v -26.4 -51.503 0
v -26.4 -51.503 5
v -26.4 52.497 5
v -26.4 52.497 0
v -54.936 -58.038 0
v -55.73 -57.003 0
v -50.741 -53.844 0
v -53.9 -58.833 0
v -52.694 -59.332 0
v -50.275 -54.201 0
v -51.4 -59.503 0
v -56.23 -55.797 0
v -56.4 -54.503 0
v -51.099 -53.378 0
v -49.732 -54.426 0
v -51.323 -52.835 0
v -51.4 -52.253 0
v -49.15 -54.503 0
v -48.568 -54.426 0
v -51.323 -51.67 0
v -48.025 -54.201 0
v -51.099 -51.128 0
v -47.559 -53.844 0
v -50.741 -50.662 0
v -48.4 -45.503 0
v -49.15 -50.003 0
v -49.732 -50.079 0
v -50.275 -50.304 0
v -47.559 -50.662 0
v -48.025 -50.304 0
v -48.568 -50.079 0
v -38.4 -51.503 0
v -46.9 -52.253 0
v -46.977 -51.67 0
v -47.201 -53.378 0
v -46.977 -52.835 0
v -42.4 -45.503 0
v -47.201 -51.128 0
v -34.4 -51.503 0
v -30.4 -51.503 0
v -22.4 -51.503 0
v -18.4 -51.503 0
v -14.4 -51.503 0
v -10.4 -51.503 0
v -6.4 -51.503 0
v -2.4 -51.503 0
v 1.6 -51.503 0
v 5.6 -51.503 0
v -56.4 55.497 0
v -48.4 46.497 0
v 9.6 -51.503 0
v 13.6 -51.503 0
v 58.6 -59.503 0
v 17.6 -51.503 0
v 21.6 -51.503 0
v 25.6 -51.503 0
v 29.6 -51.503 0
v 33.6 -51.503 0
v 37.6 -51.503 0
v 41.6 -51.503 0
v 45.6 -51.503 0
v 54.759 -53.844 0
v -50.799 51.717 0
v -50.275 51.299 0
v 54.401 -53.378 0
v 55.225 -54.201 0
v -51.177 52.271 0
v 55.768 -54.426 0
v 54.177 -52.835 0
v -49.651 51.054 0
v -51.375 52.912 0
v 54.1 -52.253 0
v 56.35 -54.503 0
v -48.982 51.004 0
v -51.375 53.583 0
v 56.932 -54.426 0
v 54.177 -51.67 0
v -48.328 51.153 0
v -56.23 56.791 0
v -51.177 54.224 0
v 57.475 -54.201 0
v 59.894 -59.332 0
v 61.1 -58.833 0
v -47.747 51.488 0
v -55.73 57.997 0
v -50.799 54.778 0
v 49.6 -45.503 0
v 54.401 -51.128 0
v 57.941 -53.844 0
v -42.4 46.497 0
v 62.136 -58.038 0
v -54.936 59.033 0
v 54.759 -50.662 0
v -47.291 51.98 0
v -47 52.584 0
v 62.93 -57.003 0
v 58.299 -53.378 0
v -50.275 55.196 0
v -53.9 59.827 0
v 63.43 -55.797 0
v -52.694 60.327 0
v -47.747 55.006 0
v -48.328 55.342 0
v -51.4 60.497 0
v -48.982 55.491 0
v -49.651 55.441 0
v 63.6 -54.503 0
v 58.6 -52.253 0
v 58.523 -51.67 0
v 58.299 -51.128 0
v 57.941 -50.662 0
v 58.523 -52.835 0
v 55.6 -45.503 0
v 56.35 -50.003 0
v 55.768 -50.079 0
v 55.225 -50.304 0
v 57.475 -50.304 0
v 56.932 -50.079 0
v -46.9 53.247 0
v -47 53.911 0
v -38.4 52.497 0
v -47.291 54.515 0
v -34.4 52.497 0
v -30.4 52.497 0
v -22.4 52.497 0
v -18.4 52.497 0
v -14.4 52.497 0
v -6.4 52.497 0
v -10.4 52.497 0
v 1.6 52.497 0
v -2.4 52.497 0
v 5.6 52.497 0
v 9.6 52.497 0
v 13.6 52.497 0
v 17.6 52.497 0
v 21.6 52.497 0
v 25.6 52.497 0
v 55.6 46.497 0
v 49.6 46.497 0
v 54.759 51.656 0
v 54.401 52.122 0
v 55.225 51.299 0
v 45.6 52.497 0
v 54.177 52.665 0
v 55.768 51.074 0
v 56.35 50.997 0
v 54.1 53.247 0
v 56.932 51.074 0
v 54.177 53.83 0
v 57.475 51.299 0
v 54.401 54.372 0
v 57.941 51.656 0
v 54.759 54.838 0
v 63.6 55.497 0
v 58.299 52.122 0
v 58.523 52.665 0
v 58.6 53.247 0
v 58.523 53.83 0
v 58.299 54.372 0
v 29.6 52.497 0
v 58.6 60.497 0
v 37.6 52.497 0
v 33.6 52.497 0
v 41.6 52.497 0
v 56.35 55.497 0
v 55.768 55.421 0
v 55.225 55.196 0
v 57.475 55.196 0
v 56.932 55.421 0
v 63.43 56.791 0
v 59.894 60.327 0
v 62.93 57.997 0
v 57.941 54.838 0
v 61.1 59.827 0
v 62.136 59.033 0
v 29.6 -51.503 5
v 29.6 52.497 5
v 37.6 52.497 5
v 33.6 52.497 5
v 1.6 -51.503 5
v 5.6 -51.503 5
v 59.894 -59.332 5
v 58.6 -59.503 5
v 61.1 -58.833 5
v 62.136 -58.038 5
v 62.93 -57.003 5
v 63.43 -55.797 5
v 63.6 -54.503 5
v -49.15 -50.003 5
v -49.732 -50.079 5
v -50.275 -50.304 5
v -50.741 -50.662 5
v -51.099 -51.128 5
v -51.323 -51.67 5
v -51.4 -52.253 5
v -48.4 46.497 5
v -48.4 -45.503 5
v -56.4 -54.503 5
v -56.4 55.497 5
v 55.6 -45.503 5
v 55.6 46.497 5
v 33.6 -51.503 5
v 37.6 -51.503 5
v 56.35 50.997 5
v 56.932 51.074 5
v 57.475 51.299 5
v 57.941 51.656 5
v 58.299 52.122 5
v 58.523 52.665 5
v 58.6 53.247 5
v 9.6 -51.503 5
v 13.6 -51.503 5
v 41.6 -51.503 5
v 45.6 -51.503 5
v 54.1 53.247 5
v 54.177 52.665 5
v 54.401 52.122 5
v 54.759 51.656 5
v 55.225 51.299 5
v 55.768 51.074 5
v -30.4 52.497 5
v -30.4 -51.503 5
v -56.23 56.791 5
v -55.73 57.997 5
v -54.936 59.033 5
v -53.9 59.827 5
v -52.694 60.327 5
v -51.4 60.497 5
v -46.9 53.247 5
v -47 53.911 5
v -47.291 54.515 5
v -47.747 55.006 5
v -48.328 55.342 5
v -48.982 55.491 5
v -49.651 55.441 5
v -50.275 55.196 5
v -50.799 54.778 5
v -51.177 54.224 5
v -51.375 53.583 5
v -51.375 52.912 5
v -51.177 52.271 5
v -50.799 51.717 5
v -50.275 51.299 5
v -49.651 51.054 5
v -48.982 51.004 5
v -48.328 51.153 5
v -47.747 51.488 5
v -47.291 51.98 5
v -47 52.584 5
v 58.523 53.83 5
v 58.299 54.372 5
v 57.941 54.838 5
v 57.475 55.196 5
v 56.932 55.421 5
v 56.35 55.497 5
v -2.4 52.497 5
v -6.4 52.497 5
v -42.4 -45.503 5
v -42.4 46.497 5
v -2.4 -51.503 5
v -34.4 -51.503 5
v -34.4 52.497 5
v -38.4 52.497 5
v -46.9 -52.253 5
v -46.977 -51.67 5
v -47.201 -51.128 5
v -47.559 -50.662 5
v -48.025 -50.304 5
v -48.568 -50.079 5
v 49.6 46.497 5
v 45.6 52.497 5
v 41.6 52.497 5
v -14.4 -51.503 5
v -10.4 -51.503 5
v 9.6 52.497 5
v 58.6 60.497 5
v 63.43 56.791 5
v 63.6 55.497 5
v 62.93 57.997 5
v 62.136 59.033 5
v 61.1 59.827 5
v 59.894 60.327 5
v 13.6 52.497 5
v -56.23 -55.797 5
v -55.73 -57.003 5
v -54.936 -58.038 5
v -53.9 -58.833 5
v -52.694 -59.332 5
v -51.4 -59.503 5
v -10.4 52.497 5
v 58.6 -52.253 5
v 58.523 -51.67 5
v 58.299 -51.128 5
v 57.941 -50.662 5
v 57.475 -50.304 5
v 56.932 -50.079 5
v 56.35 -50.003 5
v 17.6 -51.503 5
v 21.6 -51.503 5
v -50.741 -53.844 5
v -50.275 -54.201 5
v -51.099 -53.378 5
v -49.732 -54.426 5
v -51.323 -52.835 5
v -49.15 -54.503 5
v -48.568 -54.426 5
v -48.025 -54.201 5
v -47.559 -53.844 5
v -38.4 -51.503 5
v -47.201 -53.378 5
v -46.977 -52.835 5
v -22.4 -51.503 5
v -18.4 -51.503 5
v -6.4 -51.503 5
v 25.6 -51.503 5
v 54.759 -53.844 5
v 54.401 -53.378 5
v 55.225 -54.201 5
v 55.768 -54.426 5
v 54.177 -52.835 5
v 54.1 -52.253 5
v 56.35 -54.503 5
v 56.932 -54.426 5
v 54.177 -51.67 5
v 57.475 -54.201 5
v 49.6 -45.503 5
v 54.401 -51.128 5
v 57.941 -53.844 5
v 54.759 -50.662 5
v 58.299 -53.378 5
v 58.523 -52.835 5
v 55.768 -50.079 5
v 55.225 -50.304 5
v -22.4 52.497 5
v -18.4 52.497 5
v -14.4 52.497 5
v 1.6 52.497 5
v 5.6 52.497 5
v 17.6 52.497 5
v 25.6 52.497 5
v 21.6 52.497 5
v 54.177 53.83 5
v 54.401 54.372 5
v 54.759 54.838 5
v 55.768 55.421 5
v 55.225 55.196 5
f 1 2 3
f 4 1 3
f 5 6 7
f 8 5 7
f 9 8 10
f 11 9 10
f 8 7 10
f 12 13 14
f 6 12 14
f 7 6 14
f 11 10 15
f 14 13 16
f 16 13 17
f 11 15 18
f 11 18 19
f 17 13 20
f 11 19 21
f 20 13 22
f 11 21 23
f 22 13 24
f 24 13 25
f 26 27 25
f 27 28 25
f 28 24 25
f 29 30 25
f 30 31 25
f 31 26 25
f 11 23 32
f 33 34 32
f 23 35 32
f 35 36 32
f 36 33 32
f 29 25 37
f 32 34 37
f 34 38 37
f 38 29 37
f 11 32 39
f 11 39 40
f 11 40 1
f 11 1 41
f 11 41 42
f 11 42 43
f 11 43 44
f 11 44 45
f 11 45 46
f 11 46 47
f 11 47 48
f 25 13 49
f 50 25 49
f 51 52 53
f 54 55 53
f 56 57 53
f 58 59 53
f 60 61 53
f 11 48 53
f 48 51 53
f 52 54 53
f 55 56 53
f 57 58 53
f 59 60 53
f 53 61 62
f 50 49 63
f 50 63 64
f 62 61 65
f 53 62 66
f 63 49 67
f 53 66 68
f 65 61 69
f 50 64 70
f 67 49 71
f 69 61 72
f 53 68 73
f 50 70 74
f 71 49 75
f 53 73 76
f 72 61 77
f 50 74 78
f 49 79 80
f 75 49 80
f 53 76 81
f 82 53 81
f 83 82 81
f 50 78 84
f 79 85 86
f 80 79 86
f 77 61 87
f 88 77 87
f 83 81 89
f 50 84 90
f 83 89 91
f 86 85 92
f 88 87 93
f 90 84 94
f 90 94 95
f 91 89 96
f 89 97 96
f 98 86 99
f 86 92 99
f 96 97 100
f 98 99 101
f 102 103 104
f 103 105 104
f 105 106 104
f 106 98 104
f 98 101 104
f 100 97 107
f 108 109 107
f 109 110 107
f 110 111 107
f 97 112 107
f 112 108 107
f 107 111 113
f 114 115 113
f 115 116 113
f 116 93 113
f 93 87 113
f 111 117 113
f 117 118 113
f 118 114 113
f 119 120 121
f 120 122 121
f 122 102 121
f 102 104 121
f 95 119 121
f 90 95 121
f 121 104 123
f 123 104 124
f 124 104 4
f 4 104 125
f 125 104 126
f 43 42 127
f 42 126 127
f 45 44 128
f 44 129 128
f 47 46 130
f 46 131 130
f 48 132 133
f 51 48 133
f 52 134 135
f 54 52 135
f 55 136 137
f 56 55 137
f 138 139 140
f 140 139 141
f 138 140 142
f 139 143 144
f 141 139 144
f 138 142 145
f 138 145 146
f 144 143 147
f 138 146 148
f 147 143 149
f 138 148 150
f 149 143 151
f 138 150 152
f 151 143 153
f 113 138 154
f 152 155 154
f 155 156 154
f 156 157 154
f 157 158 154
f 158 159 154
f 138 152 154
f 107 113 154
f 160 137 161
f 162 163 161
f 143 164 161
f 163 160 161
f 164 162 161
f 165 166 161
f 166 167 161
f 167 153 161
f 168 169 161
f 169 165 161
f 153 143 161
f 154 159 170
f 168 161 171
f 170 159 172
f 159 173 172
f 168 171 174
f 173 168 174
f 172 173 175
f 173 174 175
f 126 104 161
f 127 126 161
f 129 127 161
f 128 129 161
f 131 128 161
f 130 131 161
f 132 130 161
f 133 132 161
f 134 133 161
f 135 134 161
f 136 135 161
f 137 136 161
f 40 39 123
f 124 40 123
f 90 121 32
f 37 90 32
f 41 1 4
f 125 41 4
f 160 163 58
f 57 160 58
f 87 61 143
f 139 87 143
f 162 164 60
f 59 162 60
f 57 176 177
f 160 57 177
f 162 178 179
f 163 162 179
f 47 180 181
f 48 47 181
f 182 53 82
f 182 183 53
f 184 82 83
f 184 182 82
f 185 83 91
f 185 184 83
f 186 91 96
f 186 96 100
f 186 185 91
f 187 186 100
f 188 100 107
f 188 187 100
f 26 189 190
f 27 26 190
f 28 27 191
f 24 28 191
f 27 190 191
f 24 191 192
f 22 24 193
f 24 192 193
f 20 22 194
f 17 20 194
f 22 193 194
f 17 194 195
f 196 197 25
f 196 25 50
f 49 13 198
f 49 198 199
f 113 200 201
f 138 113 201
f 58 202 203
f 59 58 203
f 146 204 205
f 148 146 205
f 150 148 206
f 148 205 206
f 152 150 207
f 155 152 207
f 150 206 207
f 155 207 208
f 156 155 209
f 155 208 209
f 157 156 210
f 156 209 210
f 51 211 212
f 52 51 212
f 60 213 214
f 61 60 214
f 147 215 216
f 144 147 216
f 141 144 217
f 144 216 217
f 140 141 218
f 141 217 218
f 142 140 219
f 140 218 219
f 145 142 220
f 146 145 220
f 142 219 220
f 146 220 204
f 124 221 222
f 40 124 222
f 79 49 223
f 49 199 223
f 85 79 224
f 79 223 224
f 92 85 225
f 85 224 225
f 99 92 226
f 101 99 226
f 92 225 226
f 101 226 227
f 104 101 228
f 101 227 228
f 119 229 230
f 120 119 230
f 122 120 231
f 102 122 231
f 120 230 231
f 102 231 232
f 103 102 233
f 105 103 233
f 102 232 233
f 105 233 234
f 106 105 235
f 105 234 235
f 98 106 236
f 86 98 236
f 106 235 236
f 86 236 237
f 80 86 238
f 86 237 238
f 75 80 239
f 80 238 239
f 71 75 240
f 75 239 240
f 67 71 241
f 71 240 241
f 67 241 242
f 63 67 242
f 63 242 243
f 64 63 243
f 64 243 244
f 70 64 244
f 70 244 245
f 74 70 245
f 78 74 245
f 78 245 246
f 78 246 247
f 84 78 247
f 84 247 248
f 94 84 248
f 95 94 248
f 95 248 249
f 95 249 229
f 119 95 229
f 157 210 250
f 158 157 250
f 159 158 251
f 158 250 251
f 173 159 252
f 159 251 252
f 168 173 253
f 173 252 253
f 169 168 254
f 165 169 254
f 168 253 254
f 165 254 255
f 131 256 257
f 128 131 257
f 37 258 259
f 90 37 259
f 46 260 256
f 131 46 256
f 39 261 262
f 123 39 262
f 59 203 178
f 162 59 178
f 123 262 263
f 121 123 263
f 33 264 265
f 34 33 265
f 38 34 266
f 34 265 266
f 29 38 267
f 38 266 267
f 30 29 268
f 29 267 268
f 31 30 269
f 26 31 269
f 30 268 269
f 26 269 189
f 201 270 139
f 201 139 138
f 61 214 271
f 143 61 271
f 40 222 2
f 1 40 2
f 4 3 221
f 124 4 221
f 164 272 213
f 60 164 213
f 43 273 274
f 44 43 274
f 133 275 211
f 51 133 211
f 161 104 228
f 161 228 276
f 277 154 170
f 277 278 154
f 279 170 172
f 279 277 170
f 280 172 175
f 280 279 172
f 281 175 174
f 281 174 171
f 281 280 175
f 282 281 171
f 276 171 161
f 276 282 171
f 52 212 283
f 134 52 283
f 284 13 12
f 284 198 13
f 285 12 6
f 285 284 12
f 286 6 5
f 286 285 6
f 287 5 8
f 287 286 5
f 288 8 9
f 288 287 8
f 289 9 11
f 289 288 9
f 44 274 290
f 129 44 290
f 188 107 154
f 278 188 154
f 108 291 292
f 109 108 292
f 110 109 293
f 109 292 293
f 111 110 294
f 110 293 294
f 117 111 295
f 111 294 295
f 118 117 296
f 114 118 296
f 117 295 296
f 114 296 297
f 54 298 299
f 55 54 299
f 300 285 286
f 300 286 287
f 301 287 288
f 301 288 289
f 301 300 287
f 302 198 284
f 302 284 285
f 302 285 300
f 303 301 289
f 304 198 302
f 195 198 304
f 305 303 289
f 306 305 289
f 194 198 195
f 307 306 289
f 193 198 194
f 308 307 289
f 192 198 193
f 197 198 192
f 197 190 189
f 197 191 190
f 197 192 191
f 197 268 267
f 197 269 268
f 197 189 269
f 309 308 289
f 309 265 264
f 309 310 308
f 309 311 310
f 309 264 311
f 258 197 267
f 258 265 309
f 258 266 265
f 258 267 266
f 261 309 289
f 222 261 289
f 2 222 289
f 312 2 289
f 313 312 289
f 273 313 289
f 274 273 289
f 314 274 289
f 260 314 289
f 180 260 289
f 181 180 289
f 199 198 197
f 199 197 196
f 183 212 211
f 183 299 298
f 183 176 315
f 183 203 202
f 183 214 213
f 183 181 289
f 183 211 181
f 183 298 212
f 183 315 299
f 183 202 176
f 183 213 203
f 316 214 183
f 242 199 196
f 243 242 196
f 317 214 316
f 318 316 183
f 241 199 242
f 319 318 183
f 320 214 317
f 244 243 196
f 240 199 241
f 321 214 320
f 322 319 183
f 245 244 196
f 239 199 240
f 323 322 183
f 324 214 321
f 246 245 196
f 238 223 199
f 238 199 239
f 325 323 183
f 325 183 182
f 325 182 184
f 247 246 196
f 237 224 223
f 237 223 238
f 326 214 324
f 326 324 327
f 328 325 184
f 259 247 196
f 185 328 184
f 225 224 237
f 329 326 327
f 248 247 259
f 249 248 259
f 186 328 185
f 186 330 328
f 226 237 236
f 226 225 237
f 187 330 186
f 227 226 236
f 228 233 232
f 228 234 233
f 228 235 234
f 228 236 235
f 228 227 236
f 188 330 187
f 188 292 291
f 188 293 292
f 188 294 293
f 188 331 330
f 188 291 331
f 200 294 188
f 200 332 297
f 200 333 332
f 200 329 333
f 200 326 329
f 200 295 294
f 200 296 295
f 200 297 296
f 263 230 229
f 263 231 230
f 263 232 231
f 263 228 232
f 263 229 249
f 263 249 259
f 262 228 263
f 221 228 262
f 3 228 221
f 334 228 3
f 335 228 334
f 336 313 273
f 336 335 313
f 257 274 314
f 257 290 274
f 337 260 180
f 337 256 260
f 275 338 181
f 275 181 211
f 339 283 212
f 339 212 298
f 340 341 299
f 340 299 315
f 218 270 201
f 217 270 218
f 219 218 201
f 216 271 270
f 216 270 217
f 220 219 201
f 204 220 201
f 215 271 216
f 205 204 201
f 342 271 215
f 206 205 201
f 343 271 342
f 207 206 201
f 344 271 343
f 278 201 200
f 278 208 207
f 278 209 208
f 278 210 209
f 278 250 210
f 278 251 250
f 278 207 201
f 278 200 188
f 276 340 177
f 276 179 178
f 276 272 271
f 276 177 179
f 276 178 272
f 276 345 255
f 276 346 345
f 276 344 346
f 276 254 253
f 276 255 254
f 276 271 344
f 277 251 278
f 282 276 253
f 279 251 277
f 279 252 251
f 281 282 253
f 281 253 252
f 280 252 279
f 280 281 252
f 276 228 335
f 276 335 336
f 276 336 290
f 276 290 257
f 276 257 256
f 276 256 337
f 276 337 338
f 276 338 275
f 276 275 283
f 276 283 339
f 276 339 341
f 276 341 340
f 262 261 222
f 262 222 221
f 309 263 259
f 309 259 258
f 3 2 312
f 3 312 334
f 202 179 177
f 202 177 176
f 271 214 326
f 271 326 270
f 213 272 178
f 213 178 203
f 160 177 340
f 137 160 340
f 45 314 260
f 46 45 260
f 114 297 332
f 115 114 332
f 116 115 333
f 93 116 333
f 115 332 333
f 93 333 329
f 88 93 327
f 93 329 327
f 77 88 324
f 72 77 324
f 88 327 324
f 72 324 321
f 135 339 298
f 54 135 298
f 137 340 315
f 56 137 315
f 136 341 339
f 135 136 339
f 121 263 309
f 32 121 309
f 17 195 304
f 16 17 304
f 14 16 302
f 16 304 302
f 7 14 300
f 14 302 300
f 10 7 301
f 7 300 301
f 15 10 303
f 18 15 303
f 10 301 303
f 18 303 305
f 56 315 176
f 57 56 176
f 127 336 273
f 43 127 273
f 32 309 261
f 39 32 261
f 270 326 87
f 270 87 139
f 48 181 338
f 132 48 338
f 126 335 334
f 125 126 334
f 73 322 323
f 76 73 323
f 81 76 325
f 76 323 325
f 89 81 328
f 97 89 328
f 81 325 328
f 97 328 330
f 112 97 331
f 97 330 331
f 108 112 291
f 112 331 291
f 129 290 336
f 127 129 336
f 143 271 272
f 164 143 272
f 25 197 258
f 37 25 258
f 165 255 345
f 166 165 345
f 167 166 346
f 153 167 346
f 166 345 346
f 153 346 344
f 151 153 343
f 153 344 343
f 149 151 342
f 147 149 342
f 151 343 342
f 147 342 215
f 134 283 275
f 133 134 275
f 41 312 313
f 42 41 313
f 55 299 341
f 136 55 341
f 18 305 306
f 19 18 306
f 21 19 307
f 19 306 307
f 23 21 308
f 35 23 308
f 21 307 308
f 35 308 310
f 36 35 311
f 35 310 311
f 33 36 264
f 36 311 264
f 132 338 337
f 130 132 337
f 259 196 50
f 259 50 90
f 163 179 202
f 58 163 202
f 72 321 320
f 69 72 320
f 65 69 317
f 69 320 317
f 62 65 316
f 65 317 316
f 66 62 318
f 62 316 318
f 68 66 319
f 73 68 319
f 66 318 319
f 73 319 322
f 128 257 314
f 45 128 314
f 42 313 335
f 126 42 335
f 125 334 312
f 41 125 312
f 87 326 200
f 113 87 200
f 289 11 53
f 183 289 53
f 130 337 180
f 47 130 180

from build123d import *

# Parameters (mm, degrees)
F0_W     = 120
F0_H     = 120
F1_DEPTH = 5
F2_R     = 5
F3_R     = 2.25
F4_DEPTH = 25
F5_W     = 6
F5_H     = 92
F6_DEPTH = 25
F7_DEPTH = 25
F8_DEPTH = 25


with BuildPart() as f1:
    # F0 (on Top) → F1 (new body)
    with BuildSketch(Plane.XY):
        with Locations((3.6000026762, 0.4973127641)):
            Rectangle(F0_W, F0_H)
    extrude(amount=F1_DEPTH)

    # F2
    f2_edges = [f1.edges().sort_by_distance(p)[0] for p in [
        (-56.399997, 60.497313, 2.5),
        (63.600003, 60.497313, 2.5),
        (63.600003, -59.502687, 2.5),
        (-56.399997, -59.502687, 2.5),
    ]]
    fillet(f2_edges, radius=F2_R)

    # F3 (on face) → F4 (cut)
    with BuildSketch(Plane.XY.offset(5)):
        with Locations((-49.1499973238, 53.2473127641)):
            Circle(F3_R)
        with BuildLine():
            ThreePointArc((56.3500026762, 50.9973127641), (57.9409929339, 51.6563225064), (58.6000026762, 53.2473127641))
            Line((58.6000026762, 53.2473127641), (56.3500026762, 53.2473127641))
            Line((56.3500026762, 53.2473127641), (56.3500026762, 50.9973127641))
        make_face()
        with BuildLine():
            Line((56.3500026762, 53.2473127641), (58.6000026762, 53.2473127641))
            ThreePointArc((58.6000026762, 53.2473127641), (57.9409929339, 54.8383030217), (56.3500026762, 55.4973127641))
            Line((56.3500026762, 55.4973127641), (56.3500026762, 53.2473127641))
        make_face()
        with BuildLine():
            Line((56.3500026762, 50.9973127641), (56.3500026762, 53.2473127641))
            Line((56.3500026762, 53.2473127641), (54.1000026762, 53.2473127641))
            ThreePointArc((54.1000026762, 53.2473127641), (54.7590124186, 51.6563225064), (56.3500026762, 50.9973127641))
        make_face()
        with BuildLine():
            Line((54.1000026762, 53.2473127641), (56.3500026762, 53.2473127641))
            Line((56.3500026762, 53.2473127641), (56.3500026762, 55.4973127641))
            ThreePointArc((56.3500026762, 55.4973127641), (54.7590124186, 54.8383030217), (54.1000026762, 53.2473127641))
        make_face()
        with BuildLine():
            ThreePointArc((-51.3999973238, -52.2526872359), (-50.7409875814, -53.8436774936), (-49.1499973238, -54.5026872359))
            Line((-49.1499973238, -54.5026872359), (-49.1499973238, -52.2526872359))
            Line((-49.1499973238, -52.2526872359), (-51.3999973238, -52.2526872359))
        make_face()
        with BuildLine():
            Line((-49.1499973238, -52.2526872359), (-49.1499973238, -54.5026872359))
            ThreePointArc((-49.1499973238, -54.5026872359), (-47.5590070661, -53.8436774936), (-46.8999973238, -52.2526872359))
            Line((-46.8999973238, -52.2526872359), (-49.1499973238, -52.2526872359))
        make_face()
        with BuildLine():
            Line((-51.3999973238, -52.2526872359), (-49.1499973238, -52.2526872359))
            Line((-49.1499973238, -52.2526872359), (-49.1499973238, -50.0026872359))
            ThreePointArc((-49.1499973238, -50.0026872359), (-50.7409875814, -50.6616969783), (-51.3999973238, -52.2526872359))
        make_face()
        with BuildLine():
            Line((-49.1499973238, -50.0026872359), (-49.1499973238, -52.2526872359))
            Line((-49.1499973238, -52.2526872359), (-46.8999973238, -52.2526872359))
            ThreePointArc((-46.8999973238, -52.2526872359), (-47.5590070661, -50.6616969783), (-49.1499973238, -50.0026872359))
        make_face()
        with BuildLine():
            ThreePointArc((54.1000026762, -52.2526872359), (54.7590124186, -53.8436774936), (56.3500026762, -54.5026872359))
            Line((56.3500026762, -54.5026872359), (56.3500026762, -52.2526872359))
            Line((56.3500026762, -52.2526872359), (54.1000026762, -52.2526872359))
        make_face()
        with BuildLine():
            Line((56.3500026762, -52.2526872359), (56.3500026762, -54.5026872359))
            ThreePointArc((56.3500026762, -54.5026872359), (57.9409929339, -53.8436774936), (58.6000026762, -52.2526872359))
            Line((58.6000026762, -52.2526872359), (56.3500026762, -52.2526872359))
        make_face()
        with BuildLine():
            Line((54.1000026762, -52.2526872359), (56.3500026762, -52.2526872359))
            Line((56.3500026762, -52.2526872359), (56.3500026762, -50.0026872359))
            ThreePointArc((56.3500026762, -50.0026872359), (54.7590124186, -50.6616969783), (54.1000026762, -52.2526872359))
        make_face()
        with BuildLine():
            Line((56.3500026762, -50.0026872359), (56.3500026762, -52.2526872359))
            Line((56.3500026762, -52.2526872359), (58.6000026762, -52.2526872359))
            ThreePointArc((58.6000026762, -52.2526872359), (57.9409929339, -50.6616969783), (56.3500026762, -50.0026872359))
        make_face()
    extrude(amount=-F4_DEPTH, mode=Mode.SUBTRACT)

    # F5 (on face) → F6 (cut)
    with BuildSketch(Plane.XY.offset(5)):
        with Locations((-45.3999973238, 0.4973127641)):
            Rectangle(F5_W, F5_H)
    extrude(amount=-F6_DEPTH, mode=Mode.SUBTRACT)

    # F5 (on face) → F7 (cut)
    with BuildSketch(Plane.XY.offset(5)):
        Polygon((-34.3999973238, 52.4973127641), (-38.3999973238, 52.4973127641), (-38.3999973238, 46.4973127641), (-38.3999973238, -45.5026872359), (-38.3999973238, -51.5026872359), (-34.3999973238, -51.5026872359), (-34.3999973238, -45.5026872359), (-34.3999973238, 46.4973127641), align=None)
        Polygon((-26.3999973238, 52.4973127641), (-30.3999973238, 52.4973127641), (-30.3999973238, 46.4973127641), (-30.3999973238, -45.5026872359), (-30.3999973238, -51.5026872359), (-26.3999973238, -51.5026872359), (-26.3999973238, -45.5026872359), (-26.3999973238, 46.4973127641), align=None)
        Polygon((-18.3999973238, 52.4973127641), (-22.3999973238, 52.4973127641), (-22.3999973238, 46.4973127641), (-22.3999973238, -45.5026872359), (-22.3999973238, -51.5026872359), (-18.3999973238, -51.5026872359), (-18.3999973238, -45.5026872359), (-18.3999973238, 46.4973127641), align=None)
        Polygon((-10.3999973238, 52.4973127641), (-14.3999973238, 52.4973127641), (-14.3999973238, 46.4973127641), (-14.3999973238, -45.5026872359), (-14.3999973238, -51.5026872359), (-10.3999973238, -51.5026872359), (-10.3999973238, -45.5026872359), (-10.3999973238, 46.4973127641), align=None)
        Polygon((-2.3999973238, 52.4973127641), (-6.3999973238, 52.4973127641), (-6.3999973238, 46.4973127641), (-6.3999973238, -45.5026872359), (-6.3999973238, -51.5026872359), (-2.3999973238, -51.5026872359), (-2.3999973238, -45.5026872359), (-2.3999973238, 46.4973127641), align=None)
        Polygon((5.6000026762, 52.4973127641), (1.6000026762, 52.4973127641), (1.6000026762, 46.4973127641), (1.6000026762, -45.5026872359), (1.6000026762, -51.5026872359), (5.6000026762, -51.5026872359), (5.6000026762, -45.5026872359), (5.6000026762, 46.4973127641), align=None)
        Polygon((13.6000026762, 46.4973127641), (13.6000026762, 52.4973127641), (9.6000026762, 52.4973127641), (9.6000026762, 46.4973127641), (9.6000026762, -45.5026872359), (9.6000026762, -51.5026872359), (13.6000026762, -51.5026872359), (13.6000026762, -45.5026872359), align=None)
        Polygon((21.6000026762, 46.4973127641), (21.6000026762, 52.4973127641), (17.6000026762, 52.4973127641), (17.6000026762, 46.4973127641), (17.6000026762, -45.5026872359), (17.6000026762, -51.5026872359), (21.6000026762, -51.5026872359), (21.6000026762, -45.5026872359), align=None)
        Polygon((29.6000026762, 46.4973127641), (29.6000026762, 52.4973127641), (25.6000026762, 52.4973127641), (25.6000026762, 46.4973127641), (25.6000026762, -45.5026872359), (25.6000026762, -51.5026872359), (29.6000026762, -51.5026872359), (29.6000026762, -45.5026872359), align=None)
        Polygon((37.6000026762, 46.4973127641), (37.6000026762, 52.4973127641), (33.6000026762, 52.4973127641), (33.6000026762, 46.4973127641), (33.6000026762, -45.5026872359), (33.6000026762, -51.5026872359), (37.6000026762, -51.5026872359), (37.6000026762, -45.5026872359), align=None)
        Polygon((45.6000026762, 46.4973127641), (45.6000026762, 52.4973127641), (41.6000026762, 52.4973127641), (41.6000026762, 46.4973127641), (41.6000026762, -45.5026872359), (41.6000026762, -51.5026872359), (45.6000026762, -51.5026872359), (45.6000026762, -45.5026872359), align=None)
    extrude(amount=-F7_DEPTH, mode=Mode.SUBTRACT)

    # F5 (on face) → F8 (cut)
    with BuildSketch(Plane.XY.offset(5)):
        with Locations((52.6000026762, 0.4973127641)):
            Rectangle(F5_W, F5_H)
    extrude(amount=-F8_DEPTH, mode=Mode.SUBTRACT)


solid = f1.part
